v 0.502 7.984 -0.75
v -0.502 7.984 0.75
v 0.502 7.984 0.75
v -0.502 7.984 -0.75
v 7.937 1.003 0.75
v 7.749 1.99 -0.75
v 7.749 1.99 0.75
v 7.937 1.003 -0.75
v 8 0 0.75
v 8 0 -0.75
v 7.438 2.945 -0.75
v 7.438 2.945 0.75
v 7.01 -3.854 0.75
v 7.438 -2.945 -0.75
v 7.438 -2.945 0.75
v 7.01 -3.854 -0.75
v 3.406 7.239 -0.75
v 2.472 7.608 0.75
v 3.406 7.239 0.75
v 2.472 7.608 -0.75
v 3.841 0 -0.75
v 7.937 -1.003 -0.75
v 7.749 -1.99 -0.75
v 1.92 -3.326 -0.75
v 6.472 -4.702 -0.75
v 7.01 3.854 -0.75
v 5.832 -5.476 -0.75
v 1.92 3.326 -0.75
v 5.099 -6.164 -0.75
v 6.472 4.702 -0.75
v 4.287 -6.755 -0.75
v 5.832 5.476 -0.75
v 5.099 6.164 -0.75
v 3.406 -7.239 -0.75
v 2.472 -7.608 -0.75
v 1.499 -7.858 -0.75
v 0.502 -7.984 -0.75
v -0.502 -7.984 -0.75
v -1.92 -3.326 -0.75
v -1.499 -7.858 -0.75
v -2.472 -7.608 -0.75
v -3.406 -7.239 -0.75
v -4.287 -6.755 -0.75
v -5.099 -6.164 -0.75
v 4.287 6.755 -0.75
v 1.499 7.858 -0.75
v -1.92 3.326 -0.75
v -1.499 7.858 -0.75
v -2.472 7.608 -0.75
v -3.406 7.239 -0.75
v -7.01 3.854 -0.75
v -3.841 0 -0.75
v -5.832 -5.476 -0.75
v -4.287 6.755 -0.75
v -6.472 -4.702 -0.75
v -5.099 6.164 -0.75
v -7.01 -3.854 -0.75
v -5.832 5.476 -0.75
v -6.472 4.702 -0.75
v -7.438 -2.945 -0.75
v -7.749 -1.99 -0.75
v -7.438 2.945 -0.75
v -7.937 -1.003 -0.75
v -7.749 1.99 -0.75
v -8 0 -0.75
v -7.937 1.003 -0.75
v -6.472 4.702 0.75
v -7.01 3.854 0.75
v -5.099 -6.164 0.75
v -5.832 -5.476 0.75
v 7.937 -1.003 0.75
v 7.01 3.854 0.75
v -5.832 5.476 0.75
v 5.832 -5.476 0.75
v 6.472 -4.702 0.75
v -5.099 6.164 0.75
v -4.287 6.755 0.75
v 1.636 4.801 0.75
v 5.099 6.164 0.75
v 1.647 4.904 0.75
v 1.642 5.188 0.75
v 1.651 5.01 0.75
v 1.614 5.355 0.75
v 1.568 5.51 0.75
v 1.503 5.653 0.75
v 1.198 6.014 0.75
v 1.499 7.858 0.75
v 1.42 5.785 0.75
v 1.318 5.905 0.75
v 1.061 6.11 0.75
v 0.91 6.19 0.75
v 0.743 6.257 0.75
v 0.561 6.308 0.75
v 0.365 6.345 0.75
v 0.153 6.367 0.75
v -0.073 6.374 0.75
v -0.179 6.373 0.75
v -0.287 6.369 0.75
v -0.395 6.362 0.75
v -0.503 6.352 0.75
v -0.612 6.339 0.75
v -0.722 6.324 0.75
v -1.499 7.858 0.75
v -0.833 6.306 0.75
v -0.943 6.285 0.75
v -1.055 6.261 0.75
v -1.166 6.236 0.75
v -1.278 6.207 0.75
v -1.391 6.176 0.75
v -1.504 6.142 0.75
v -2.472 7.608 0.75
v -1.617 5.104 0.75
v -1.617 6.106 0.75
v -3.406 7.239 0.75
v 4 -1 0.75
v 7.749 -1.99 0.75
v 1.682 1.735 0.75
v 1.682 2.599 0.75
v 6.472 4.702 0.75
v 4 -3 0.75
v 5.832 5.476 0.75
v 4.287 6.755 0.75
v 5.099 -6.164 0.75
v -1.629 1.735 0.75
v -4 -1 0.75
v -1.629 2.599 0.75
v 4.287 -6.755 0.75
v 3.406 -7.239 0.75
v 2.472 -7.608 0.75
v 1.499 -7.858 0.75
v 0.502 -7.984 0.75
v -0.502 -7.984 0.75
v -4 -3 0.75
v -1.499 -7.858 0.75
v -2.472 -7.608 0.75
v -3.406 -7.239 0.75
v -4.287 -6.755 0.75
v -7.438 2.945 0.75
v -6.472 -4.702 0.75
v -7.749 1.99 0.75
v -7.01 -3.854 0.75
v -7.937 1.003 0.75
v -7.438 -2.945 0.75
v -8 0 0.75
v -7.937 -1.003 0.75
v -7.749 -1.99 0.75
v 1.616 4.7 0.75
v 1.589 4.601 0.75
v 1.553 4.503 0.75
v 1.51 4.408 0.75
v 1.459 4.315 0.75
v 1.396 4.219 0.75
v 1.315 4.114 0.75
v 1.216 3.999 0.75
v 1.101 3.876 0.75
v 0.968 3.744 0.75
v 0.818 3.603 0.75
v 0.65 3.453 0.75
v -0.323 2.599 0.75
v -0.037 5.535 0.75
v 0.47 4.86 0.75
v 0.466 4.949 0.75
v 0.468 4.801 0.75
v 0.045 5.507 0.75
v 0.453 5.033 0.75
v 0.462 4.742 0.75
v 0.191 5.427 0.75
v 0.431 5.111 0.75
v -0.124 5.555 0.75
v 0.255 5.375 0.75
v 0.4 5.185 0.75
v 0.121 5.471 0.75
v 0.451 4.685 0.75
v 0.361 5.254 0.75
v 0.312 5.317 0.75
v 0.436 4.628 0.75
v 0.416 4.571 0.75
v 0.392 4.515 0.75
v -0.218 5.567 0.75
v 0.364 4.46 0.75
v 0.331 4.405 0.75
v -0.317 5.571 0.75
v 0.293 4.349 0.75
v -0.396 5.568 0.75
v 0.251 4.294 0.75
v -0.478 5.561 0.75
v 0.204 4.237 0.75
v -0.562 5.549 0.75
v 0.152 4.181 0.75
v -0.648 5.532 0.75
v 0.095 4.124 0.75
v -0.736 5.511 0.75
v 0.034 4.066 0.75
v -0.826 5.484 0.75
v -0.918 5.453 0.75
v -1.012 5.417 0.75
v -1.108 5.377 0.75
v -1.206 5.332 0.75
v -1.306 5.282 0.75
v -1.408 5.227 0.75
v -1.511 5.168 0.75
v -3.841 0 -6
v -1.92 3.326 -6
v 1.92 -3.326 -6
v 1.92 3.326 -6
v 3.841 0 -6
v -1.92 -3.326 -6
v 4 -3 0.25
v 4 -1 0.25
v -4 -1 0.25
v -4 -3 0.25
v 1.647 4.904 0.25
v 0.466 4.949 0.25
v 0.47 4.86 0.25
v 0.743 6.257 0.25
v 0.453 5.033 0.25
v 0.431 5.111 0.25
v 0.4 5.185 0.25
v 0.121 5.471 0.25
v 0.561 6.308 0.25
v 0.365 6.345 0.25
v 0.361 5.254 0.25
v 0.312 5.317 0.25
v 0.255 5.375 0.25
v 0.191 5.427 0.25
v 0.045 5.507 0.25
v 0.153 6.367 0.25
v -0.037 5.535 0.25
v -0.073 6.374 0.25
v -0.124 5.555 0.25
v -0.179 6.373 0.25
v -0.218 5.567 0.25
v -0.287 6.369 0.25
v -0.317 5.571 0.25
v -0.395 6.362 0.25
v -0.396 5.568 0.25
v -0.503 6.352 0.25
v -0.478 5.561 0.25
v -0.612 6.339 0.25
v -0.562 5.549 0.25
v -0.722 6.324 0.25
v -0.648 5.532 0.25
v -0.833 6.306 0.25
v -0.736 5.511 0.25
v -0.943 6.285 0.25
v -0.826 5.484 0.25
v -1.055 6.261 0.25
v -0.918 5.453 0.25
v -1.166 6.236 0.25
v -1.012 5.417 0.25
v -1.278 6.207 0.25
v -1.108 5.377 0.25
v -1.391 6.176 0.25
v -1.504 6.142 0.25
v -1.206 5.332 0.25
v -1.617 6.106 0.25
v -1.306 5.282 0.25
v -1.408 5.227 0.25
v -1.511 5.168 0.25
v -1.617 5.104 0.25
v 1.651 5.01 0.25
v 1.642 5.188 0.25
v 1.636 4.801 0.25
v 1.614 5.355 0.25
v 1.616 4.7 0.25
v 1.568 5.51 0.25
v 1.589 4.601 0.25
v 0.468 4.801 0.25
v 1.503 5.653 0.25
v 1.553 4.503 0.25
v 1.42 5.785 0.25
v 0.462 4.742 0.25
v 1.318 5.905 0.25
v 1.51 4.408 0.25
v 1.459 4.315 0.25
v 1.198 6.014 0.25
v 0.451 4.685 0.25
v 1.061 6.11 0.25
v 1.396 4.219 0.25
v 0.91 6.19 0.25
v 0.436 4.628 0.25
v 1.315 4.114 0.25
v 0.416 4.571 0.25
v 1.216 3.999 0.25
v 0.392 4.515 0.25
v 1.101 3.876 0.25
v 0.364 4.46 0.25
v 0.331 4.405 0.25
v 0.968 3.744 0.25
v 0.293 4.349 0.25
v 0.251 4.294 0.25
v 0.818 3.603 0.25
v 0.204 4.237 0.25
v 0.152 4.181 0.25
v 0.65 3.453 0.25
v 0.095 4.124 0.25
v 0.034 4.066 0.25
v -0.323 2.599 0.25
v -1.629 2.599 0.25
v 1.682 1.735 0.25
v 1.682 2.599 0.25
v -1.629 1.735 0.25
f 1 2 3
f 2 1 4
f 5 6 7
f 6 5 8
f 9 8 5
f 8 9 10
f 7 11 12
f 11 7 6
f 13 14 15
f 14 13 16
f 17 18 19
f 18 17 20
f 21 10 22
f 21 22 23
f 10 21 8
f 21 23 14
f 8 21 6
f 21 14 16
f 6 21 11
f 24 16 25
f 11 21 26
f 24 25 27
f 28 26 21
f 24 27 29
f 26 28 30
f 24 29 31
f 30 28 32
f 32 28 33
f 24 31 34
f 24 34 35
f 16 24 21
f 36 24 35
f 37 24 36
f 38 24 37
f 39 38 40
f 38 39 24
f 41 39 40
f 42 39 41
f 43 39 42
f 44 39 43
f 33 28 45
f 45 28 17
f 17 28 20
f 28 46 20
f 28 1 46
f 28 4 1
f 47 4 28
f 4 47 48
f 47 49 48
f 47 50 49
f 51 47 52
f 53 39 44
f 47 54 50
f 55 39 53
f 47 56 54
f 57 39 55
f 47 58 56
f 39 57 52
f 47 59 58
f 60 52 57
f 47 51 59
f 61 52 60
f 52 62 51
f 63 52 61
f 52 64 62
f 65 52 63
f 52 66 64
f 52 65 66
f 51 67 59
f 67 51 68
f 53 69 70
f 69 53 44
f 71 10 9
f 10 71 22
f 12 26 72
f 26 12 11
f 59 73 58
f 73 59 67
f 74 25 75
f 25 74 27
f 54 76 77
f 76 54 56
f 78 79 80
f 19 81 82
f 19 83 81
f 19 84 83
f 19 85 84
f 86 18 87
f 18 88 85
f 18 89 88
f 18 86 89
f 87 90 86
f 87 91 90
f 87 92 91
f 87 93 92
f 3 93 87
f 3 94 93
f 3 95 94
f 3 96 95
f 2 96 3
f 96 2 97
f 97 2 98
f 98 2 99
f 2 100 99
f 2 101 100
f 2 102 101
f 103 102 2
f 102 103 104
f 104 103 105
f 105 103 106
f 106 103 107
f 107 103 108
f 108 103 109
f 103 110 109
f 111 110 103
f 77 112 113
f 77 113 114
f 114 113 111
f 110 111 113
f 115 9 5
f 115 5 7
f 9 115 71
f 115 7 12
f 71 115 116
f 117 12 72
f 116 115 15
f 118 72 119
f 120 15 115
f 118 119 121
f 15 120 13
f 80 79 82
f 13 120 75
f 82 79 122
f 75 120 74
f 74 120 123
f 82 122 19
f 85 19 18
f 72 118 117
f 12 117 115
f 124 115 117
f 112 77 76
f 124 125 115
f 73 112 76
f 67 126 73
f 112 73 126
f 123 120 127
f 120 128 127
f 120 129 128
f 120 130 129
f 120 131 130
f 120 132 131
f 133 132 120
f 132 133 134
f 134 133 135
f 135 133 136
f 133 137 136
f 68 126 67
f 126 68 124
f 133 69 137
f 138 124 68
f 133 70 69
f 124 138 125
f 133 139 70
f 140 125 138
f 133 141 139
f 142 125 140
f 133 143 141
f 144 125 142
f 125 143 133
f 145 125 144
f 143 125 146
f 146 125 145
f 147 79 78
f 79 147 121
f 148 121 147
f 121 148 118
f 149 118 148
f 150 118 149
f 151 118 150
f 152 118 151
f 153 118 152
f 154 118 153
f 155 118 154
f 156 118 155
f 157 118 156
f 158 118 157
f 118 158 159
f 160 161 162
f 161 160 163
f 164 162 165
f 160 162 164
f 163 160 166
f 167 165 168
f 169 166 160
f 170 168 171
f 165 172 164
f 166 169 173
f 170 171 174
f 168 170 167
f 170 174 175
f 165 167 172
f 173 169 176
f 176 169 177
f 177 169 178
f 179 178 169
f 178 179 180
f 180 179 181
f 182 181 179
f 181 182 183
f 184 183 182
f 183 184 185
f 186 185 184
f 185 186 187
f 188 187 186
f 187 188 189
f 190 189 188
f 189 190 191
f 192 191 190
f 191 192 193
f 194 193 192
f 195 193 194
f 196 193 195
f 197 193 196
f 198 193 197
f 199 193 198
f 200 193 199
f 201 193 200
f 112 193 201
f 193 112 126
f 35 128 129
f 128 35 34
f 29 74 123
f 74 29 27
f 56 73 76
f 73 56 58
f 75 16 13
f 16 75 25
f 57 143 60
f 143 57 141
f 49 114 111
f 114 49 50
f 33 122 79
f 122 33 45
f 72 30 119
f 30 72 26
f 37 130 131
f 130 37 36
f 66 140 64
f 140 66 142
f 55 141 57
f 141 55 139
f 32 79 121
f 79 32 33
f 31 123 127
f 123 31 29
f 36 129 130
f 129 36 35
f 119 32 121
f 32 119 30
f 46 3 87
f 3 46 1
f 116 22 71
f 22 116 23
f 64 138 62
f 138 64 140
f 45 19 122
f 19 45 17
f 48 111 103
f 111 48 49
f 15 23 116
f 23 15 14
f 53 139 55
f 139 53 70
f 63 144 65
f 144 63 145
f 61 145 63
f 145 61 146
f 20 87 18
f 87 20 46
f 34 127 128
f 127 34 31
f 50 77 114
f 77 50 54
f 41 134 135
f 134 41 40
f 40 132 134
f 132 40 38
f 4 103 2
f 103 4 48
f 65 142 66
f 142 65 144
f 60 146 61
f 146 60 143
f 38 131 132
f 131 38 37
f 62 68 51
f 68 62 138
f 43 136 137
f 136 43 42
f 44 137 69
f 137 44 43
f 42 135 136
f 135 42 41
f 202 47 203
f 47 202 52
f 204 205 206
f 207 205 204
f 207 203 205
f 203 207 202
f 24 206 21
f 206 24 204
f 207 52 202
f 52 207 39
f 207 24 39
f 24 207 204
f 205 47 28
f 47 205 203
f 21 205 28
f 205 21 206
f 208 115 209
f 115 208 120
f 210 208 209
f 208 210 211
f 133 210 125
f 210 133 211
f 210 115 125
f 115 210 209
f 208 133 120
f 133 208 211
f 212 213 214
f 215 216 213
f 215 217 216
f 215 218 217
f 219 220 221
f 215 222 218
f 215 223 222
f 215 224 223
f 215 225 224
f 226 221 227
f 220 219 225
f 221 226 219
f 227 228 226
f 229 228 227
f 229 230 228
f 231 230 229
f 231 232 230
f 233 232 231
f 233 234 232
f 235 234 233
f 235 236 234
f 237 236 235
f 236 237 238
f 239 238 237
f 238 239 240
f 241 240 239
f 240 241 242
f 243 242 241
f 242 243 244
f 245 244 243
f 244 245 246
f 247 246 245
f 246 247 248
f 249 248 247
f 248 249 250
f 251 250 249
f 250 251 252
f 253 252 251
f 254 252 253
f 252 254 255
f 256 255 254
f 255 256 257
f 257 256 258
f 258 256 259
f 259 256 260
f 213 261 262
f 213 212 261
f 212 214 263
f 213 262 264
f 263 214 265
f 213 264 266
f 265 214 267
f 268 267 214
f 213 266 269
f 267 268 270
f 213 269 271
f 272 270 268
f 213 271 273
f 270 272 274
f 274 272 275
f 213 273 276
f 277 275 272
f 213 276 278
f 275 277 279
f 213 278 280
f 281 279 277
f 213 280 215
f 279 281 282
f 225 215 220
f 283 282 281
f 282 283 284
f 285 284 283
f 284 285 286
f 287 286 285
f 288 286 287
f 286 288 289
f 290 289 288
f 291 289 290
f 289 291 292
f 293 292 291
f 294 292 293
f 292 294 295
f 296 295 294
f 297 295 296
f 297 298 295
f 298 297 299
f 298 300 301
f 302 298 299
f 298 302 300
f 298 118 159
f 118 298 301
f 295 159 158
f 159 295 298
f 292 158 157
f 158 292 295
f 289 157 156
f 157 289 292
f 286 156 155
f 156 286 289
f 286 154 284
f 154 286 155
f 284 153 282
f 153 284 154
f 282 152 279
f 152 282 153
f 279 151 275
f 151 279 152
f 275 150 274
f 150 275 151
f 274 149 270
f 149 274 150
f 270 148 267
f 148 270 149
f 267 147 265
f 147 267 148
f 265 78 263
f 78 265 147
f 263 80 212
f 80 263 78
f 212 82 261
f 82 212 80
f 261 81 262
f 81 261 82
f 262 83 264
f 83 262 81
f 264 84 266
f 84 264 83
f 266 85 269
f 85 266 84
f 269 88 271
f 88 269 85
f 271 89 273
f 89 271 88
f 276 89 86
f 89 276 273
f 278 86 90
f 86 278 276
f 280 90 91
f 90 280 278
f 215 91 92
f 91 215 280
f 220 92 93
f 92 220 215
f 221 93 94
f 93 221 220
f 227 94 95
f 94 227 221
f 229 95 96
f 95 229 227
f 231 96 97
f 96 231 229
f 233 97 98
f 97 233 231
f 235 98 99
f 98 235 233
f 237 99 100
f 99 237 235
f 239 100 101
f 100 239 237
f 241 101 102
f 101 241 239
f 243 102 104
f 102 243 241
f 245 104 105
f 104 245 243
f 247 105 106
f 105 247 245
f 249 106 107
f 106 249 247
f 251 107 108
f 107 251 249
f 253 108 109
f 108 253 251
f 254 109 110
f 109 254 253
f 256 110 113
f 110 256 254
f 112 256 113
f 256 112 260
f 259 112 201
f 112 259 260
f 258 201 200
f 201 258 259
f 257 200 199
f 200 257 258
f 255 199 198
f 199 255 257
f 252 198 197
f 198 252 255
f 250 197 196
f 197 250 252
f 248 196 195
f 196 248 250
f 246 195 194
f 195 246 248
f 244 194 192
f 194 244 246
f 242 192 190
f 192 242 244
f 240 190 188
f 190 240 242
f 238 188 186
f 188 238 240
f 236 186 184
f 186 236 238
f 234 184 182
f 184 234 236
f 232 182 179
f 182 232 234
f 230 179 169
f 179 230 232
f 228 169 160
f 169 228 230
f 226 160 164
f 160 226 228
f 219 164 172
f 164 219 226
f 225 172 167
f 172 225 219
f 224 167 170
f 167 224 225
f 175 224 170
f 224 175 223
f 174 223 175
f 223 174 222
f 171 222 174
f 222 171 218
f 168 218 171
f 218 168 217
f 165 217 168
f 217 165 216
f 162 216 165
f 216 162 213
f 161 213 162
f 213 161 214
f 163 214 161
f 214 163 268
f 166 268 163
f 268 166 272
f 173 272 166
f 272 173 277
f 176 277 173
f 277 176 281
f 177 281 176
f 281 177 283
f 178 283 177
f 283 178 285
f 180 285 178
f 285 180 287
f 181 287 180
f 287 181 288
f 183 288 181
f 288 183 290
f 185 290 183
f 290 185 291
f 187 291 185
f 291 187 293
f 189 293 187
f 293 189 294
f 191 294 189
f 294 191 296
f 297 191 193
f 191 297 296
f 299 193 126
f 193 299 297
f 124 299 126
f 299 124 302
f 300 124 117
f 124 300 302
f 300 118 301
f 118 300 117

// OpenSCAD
$fn = 50;


difference() {
	union() {
		translate(v = [0, 0, -0.7500000000]) {
			cylinder(h = 1.5000000000, r = 8.0000000000);
		}
		translate(v = [0, 0, -6]) {
			linear_extrude(height = 6) {
				polygon(points = [[3.8408550000, 0.0000000000], [1.9204275000, 3.3262780023], [-1.9204275000, 3.3262780023], [-3.8408550000, 0.0000000000], [-1.9204275000, -3.3262780023], [1.9204275000, -3.3262780023]]);
			}
		}
	}
	union() {
		#translate(v = [-4.0000000000, -3.0000000000, 0.2500000000]) {
			cube(size = [8, 2, 0.5000000000]);
		}
		#translate(v = [0, 4, 0.2500000000]) {
			linear_extrude(height = 0.5000000000) {
				text(font = "SegoiUI:Bold", halign = "center", size = 4.5000000000, text = "2", valign = "center");
			}
		}
	}
}
